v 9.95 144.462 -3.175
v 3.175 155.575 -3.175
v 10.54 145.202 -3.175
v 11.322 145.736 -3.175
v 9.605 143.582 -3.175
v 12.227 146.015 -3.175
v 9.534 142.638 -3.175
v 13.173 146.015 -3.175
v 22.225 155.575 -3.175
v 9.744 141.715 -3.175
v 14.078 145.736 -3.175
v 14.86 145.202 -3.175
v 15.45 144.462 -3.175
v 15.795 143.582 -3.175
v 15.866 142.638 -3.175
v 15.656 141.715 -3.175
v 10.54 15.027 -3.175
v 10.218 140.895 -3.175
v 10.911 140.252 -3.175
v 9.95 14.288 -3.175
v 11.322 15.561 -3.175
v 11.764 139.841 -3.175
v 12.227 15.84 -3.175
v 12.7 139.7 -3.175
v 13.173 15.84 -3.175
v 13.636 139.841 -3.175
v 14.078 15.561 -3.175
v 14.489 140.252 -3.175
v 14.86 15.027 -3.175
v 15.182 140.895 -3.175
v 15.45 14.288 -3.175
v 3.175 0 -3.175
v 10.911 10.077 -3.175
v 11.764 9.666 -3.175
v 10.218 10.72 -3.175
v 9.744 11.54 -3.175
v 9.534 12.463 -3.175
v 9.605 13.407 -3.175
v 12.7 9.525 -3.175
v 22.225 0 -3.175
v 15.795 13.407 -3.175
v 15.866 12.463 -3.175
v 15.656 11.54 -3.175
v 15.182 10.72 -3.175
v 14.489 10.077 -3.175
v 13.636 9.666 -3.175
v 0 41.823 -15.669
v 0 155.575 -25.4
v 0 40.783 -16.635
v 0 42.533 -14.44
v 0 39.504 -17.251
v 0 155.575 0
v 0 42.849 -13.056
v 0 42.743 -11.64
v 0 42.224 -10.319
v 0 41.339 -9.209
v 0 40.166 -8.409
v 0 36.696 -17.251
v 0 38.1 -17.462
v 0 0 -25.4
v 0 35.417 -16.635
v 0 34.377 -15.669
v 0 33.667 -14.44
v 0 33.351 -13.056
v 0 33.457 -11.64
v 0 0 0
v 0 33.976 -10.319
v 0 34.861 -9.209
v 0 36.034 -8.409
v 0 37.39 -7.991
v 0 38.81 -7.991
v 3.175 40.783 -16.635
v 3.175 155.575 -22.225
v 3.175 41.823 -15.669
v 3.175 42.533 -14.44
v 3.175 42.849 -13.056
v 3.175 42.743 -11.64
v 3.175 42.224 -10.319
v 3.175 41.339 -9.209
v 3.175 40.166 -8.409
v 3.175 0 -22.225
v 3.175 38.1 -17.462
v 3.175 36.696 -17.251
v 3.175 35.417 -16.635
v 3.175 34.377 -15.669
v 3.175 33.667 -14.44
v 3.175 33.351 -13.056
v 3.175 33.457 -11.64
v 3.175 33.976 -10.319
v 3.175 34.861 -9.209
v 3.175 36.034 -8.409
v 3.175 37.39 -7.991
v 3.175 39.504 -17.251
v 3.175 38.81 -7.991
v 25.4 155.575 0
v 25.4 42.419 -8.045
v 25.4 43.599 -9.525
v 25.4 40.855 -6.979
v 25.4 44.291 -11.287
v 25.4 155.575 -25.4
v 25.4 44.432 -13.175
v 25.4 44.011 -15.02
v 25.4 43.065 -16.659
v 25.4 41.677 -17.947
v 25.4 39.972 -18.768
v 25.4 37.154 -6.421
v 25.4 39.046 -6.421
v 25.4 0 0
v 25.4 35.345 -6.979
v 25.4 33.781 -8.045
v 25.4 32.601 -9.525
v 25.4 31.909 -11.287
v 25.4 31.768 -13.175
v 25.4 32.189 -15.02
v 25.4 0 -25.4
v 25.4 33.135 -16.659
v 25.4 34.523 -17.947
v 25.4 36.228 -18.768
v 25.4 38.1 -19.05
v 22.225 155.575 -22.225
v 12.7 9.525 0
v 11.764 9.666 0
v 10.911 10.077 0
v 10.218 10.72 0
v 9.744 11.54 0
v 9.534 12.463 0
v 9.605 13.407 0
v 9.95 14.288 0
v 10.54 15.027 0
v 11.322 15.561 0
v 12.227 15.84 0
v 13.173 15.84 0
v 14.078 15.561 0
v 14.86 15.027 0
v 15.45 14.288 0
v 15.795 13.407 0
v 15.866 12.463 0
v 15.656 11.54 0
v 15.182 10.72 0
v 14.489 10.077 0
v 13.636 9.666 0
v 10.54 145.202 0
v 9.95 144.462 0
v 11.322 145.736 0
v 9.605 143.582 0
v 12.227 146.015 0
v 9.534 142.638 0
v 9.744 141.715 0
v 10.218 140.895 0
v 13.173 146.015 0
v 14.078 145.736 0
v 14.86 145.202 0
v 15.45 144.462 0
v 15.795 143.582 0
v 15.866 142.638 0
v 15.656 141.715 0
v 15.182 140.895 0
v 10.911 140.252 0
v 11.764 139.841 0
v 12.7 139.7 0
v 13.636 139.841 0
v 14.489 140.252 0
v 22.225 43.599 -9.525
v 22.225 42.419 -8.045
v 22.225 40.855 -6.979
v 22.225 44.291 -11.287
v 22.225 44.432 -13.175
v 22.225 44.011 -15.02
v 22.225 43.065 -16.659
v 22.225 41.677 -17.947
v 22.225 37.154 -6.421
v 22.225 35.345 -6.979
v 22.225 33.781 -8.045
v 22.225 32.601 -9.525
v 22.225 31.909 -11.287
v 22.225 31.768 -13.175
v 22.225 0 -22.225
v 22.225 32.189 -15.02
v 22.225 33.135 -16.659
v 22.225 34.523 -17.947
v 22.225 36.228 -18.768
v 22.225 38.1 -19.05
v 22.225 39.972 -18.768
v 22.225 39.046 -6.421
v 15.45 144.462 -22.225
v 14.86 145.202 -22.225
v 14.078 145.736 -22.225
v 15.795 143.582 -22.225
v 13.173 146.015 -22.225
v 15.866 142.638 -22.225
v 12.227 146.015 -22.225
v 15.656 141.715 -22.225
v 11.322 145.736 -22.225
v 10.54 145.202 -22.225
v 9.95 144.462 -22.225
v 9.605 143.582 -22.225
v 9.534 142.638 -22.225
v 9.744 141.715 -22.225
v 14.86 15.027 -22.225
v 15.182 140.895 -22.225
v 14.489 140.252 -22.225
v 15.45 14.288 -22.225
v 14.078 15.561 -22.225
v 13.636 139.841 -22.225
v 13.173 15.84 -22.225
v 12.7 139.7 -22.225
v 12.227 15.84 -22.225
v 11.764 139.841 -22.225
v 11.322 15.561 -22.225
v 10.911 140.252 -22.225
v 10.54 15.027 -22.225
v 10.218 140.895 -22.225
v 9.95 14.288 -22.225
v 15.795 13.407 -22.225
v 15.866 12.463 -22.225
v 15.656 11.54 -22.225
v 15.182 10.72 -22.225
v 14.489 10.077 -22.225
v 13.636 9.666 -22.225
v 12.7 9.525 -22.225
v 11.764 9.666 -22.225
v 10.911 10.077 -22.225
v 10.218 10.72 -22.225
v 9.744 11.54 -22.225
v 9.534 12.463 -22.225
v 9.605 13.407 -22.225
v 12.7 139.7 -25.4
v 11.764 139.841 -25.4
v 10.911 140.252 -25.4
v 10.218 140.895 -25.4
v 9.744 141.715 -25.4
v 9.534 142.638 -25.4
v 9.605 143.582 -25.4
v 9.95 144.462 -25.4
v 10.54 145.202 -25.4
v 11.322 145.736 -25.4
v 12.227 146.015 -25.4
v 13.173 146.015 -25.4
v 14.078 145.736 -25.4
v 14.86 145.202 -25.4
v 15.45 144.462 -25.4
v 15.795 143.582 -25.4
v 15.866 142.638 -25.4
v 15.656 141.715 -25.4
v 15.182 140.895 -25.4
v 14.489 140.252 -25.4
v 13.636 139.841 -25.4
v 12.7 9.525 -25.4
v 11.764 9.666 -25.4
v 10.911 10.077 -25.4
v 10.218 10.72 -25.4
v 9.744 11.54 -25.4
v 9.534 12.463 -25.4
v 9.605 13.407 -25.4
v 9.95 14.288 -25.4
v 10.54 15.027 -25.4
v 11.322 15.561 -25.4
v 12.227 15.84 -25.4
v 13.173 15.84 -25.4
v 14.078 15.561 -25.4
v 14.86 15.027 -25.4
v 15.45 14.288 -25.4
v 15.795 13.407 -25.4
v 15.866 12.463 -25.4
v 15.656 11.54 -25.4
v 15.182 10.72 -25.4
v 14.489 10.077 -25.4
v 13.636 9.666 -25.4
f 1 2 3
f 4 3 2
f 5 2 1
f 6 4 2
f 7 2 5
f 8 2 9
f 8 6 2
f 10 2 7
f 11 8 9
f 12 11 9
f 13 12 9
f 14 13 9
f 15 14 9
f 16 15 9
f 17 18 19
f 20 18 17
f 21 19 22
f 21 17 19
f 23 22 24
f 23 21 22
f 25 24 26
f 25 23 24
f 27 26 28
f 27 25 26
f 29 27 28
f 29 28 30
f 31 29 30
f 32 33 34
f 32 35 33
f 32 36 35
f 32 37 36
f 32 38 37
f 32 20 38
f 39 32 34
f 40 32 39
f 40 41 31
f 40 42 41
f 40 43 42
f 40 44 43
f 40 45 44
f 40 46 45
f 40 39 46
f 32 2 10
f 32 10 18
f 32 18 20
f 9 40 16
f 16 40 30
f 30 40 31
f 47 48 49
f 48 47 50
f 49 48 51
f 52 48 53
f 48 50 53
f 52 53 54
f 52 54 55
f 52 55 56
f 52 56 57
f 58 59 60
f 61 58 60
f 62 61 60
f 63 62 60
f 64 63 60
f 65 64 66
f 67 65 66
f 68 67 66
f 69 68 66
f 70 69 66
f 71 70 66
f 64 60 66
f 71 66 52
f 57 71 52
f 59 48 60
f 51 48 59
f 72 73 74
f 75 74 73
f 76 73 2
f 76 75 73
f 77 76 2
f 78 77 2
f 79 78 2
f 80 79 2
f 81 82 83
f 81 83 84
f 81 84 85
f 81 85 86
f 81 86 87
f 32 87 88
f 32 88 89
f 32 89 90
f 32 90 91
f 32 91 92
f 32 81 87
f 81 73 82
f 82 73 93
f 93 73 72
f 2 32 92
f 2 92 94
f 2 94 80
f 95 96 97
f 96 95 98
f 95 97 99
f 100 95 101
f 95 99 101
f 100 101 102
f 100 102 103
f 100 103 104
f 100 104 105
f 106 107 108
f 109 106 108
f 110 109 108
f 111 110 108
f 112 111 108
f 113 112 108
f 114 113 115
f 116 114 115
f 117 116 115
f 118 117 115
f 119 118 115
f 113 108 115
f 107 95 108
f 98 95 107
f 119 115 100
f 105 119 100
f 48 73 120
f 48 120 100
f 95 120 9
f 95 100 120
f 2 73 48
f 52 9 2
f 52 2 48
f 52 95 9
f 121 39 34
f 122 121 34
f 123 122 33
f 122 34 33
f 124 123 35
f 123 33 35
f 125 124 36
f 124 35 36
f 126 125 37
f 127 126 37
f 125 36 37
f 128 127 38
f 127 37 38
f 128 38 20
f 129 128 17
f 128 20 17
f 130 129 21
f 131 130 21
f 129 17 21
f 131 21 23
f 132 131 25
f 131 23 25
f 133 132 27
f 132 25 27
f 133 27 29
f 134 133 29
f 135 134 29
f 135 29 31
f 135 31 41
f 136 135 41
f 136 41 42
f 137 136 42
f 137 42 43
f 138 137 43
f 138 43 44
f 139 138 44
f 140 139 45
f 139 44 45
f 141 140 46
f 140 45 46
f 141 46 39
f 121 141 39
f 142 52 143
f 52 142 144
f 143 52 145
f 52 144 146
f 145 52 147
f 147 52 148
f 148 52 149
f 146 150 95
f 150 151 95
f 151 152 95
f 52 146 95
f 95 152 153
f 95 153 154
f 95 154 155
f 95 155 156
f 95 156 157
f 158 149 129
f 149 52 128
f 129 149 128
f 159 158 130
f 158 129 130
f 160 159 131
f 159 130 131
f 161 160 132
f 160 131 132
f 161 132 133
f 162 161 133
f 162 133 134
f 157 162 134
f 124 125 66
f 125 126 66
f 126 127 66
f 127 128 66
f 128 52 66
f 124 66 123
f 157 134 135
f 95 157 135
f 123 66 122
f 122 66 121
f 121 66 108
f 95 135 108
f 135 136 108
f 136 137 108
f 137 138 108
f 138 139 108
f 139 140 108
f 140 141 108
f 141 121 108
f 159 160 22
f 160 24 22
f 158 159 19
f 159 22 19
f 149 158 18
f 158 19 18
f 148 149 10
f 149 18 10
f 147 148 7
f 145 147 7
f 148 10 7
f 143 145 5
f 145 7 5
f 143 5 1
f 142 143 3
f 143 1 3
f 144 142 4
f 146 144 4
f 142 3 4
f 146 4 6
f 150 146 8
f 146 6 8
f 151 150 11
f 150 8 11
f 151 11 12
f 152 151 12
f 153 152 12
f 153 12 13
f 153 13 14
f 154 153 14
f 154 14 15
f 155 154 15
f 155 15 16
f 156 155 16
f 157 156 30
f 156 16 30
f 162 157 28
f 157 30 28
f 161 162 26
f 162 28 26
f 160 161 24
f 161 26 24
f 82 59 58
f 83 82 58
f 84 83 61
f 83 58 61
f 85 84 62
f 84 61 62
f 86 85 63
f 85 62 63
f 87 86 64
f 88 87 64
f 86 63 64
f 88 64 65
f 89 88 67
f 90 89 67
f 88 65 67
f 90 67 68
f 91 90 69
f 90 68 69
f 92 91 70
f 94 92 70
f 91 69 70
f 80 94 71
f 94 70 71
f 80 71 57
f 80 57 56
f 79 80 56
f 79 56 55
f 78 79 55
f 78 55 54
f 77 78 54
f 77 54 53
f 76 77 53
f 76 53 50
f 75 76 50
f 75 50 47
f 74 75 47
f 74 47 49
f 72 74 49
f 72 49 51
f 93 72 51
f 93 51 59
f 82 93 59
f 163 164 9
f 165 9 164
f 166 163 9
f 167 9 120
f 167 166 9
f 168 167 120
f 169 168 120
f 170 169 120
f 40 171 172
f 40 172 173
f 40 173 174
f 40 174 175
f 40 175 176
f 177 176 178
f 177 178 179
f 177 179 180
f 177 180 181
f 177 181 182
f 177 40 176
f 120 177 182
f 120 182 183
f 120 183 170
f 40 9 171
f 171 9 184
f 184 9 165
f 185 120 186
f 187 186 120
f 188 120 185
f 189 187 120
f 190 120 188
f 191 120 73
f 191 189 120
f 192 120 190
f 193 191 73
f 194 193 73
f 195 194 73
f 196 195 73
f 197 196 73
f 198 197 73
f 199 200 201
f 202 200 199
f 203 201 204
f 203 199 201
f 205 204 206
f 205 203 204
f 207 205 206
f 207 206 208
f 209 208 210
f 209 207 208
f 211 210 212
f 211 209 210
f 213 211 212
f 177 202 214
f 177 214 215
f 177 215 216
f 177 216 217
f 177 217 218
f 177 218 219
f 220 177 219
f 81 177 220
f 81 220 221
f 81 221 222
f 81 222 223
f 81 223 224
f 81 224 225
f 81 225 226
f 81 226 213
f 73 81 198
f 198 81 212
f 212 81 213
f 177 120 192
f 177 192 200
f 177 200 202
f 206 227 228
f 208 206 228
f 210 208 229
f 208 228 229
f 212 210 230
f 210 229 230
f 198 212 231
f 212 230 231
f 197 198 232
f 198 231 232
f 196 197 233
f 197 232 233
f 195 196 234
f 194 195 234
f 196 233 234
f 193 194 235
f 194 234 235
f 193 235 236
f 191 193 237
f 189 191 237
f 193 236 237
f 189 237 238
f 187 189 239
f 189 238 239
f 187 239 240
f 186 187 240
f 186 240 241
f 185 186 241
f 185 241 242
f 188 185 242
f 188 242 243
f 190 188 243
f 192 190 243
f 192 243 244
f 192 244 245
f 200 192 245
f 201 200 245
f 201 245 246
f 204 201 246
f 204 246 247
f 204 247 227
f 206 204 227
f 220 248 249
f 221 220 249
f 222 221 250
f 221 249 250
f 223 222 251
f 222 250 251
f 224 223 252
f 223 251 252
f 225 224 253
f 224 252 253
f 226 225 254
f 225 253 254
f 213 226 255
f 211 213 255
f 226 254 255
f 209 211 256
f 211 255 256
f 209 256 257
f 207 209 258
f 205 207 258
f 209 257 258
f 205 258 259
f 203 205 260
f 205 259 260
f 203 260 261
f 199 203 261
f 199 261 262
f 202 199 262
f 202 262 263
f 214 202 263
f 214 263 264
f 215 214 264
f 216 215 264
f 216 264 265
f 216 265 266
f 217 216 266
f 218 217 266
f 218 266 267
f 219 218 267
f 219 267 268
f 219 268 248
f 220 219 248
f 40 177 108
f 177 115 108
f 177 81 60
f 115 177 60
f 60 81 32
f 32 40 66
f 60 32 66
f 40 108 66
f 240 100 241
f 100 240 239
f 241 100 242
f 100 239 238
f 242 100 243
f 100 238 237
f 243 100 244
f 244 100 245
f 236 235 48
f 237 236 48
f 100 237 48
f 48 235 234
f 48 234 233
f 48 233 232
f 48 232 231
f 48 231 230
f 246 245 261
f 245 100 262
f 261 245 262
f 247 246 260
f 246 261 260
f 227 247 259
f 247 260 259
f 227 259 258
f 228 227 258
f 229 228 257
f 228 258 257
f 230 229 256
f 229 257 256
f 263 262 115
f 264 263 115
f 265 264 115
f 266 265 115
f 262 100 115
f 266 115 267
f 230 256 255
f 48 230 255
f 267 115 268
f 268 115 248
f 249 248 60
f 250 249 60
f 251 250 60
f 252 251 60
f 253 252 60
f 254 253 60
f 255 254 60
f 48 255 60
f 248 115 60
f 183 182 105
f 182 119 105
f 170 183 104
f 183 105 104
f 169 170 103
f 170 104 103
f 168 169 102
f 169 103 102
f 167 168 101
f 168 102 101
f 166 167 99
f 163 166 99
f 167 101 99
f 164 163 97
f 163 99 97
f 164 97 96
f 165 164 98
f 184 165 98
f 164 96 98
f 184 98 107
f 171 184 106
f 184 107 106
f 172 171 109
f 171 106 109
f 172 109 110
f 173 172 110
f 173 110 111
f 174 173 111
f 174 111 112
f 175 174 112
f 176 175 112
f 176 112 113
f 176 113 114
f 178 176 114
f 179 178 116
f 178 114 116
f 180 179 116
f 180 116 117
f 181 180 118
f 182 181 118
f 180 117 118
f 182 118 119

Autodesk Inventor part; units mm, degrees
ref_plane "YZ Plane" through (0, 0, 0) normal (1, 0, 0) x (0, 1, 0)
ref_plane "XZ Plane" through (0, 0, 0) normal (0, 1, 0) x (-1, 0, 0)
ref_plane "XY Plane" through (0, 0, 0) normal (0, 0, 1) x (1, 0, 0)
sketch "Sketch1" plane through (0, 0, 0) normal (0, 1, 0) x (-1, 0, 0)
  line L0 (0, 0) -> (-25.4, 0)
  line L1 (-25.4, 0) -> (-25.4, -25.4)
  line L2 (-25.4, -25.4) -> (0, -25.4)
  line L3 (0, -25.4) -> (0, 0)
  line L4 (-3.175, -3.175) -> (-22.225, -3.175)
  line L5 (-22.225, -3.175) -> (-22.225, -22.225)
  line L6 (-22.225, -22.225) -> (-3.175, -22.225)
  line L7 (-3.175, -22.225) -> (-3.175, -3.175)
  dimension "d0" = 25.4
  dimension "d1" = 25.4
  dimension "d2" = 19.05
  dimension "d3" = 19.05
  dimension "d4" = 3.175
  dimension "d5" = 3.175
extrude "Extrusion1" add sketch "Sketch1" along normal blind 155.575
sketch "Sketch2" plane through (0, 0, 0) normal (0, 0, 1) x (1, 0, 0)
  line L0 (0, 0) -> (25.4, 0) projected
  line L1 (0, 155.575) -> (25.4, 155.575) projected
  line L2 (0, 0) -> (0, 155.575) projected
  point P0 (12.7, 142.875)
  point P1 (12.7, 12.7)
  dimension "d8" = 12.7
  dimension "d9" = 12.7
  dimension "d10" = 12.7
  dimension "d11" = 12.7
hole "Hole1" at (12.7, 142.875, 0) at (12.7, 12.7, 0) direction (0, 0, -1) diameter 6.35 end through all
sketch "Sketch3" plane through (25.4, 0, 0) normal (1, 0, 0) x (0, 0, -1)
  line L0 (0, 0) -> (25.4, 0) projected
  line L1 (0, 0) -> (0, 155.575) projected
  point P0 (12.7, 38.1)
  dimension "d21" = 12.7
  dimension "d22" = 38.1
hole "Hole2" at (25.4, 38.1, -12.7) direction (-1, 0, 0) diameter 9.525 end through all
sketch "Sketch6" plane through (25.4, 0, 0) normal (1, 0, 0) x (0, 0, -1)
  circle A0 centre (12.7, 38.1) radius 4.7625 projected
  circle A1 centre (12.7, 38.1) radius 6.35
  dimension "d54" = 12.7
extrude "Extrusion2" cut sketch "Sketch6" against normal blind 12.7
properties part number "1x1 vertical" material "Aluminum 6061"
